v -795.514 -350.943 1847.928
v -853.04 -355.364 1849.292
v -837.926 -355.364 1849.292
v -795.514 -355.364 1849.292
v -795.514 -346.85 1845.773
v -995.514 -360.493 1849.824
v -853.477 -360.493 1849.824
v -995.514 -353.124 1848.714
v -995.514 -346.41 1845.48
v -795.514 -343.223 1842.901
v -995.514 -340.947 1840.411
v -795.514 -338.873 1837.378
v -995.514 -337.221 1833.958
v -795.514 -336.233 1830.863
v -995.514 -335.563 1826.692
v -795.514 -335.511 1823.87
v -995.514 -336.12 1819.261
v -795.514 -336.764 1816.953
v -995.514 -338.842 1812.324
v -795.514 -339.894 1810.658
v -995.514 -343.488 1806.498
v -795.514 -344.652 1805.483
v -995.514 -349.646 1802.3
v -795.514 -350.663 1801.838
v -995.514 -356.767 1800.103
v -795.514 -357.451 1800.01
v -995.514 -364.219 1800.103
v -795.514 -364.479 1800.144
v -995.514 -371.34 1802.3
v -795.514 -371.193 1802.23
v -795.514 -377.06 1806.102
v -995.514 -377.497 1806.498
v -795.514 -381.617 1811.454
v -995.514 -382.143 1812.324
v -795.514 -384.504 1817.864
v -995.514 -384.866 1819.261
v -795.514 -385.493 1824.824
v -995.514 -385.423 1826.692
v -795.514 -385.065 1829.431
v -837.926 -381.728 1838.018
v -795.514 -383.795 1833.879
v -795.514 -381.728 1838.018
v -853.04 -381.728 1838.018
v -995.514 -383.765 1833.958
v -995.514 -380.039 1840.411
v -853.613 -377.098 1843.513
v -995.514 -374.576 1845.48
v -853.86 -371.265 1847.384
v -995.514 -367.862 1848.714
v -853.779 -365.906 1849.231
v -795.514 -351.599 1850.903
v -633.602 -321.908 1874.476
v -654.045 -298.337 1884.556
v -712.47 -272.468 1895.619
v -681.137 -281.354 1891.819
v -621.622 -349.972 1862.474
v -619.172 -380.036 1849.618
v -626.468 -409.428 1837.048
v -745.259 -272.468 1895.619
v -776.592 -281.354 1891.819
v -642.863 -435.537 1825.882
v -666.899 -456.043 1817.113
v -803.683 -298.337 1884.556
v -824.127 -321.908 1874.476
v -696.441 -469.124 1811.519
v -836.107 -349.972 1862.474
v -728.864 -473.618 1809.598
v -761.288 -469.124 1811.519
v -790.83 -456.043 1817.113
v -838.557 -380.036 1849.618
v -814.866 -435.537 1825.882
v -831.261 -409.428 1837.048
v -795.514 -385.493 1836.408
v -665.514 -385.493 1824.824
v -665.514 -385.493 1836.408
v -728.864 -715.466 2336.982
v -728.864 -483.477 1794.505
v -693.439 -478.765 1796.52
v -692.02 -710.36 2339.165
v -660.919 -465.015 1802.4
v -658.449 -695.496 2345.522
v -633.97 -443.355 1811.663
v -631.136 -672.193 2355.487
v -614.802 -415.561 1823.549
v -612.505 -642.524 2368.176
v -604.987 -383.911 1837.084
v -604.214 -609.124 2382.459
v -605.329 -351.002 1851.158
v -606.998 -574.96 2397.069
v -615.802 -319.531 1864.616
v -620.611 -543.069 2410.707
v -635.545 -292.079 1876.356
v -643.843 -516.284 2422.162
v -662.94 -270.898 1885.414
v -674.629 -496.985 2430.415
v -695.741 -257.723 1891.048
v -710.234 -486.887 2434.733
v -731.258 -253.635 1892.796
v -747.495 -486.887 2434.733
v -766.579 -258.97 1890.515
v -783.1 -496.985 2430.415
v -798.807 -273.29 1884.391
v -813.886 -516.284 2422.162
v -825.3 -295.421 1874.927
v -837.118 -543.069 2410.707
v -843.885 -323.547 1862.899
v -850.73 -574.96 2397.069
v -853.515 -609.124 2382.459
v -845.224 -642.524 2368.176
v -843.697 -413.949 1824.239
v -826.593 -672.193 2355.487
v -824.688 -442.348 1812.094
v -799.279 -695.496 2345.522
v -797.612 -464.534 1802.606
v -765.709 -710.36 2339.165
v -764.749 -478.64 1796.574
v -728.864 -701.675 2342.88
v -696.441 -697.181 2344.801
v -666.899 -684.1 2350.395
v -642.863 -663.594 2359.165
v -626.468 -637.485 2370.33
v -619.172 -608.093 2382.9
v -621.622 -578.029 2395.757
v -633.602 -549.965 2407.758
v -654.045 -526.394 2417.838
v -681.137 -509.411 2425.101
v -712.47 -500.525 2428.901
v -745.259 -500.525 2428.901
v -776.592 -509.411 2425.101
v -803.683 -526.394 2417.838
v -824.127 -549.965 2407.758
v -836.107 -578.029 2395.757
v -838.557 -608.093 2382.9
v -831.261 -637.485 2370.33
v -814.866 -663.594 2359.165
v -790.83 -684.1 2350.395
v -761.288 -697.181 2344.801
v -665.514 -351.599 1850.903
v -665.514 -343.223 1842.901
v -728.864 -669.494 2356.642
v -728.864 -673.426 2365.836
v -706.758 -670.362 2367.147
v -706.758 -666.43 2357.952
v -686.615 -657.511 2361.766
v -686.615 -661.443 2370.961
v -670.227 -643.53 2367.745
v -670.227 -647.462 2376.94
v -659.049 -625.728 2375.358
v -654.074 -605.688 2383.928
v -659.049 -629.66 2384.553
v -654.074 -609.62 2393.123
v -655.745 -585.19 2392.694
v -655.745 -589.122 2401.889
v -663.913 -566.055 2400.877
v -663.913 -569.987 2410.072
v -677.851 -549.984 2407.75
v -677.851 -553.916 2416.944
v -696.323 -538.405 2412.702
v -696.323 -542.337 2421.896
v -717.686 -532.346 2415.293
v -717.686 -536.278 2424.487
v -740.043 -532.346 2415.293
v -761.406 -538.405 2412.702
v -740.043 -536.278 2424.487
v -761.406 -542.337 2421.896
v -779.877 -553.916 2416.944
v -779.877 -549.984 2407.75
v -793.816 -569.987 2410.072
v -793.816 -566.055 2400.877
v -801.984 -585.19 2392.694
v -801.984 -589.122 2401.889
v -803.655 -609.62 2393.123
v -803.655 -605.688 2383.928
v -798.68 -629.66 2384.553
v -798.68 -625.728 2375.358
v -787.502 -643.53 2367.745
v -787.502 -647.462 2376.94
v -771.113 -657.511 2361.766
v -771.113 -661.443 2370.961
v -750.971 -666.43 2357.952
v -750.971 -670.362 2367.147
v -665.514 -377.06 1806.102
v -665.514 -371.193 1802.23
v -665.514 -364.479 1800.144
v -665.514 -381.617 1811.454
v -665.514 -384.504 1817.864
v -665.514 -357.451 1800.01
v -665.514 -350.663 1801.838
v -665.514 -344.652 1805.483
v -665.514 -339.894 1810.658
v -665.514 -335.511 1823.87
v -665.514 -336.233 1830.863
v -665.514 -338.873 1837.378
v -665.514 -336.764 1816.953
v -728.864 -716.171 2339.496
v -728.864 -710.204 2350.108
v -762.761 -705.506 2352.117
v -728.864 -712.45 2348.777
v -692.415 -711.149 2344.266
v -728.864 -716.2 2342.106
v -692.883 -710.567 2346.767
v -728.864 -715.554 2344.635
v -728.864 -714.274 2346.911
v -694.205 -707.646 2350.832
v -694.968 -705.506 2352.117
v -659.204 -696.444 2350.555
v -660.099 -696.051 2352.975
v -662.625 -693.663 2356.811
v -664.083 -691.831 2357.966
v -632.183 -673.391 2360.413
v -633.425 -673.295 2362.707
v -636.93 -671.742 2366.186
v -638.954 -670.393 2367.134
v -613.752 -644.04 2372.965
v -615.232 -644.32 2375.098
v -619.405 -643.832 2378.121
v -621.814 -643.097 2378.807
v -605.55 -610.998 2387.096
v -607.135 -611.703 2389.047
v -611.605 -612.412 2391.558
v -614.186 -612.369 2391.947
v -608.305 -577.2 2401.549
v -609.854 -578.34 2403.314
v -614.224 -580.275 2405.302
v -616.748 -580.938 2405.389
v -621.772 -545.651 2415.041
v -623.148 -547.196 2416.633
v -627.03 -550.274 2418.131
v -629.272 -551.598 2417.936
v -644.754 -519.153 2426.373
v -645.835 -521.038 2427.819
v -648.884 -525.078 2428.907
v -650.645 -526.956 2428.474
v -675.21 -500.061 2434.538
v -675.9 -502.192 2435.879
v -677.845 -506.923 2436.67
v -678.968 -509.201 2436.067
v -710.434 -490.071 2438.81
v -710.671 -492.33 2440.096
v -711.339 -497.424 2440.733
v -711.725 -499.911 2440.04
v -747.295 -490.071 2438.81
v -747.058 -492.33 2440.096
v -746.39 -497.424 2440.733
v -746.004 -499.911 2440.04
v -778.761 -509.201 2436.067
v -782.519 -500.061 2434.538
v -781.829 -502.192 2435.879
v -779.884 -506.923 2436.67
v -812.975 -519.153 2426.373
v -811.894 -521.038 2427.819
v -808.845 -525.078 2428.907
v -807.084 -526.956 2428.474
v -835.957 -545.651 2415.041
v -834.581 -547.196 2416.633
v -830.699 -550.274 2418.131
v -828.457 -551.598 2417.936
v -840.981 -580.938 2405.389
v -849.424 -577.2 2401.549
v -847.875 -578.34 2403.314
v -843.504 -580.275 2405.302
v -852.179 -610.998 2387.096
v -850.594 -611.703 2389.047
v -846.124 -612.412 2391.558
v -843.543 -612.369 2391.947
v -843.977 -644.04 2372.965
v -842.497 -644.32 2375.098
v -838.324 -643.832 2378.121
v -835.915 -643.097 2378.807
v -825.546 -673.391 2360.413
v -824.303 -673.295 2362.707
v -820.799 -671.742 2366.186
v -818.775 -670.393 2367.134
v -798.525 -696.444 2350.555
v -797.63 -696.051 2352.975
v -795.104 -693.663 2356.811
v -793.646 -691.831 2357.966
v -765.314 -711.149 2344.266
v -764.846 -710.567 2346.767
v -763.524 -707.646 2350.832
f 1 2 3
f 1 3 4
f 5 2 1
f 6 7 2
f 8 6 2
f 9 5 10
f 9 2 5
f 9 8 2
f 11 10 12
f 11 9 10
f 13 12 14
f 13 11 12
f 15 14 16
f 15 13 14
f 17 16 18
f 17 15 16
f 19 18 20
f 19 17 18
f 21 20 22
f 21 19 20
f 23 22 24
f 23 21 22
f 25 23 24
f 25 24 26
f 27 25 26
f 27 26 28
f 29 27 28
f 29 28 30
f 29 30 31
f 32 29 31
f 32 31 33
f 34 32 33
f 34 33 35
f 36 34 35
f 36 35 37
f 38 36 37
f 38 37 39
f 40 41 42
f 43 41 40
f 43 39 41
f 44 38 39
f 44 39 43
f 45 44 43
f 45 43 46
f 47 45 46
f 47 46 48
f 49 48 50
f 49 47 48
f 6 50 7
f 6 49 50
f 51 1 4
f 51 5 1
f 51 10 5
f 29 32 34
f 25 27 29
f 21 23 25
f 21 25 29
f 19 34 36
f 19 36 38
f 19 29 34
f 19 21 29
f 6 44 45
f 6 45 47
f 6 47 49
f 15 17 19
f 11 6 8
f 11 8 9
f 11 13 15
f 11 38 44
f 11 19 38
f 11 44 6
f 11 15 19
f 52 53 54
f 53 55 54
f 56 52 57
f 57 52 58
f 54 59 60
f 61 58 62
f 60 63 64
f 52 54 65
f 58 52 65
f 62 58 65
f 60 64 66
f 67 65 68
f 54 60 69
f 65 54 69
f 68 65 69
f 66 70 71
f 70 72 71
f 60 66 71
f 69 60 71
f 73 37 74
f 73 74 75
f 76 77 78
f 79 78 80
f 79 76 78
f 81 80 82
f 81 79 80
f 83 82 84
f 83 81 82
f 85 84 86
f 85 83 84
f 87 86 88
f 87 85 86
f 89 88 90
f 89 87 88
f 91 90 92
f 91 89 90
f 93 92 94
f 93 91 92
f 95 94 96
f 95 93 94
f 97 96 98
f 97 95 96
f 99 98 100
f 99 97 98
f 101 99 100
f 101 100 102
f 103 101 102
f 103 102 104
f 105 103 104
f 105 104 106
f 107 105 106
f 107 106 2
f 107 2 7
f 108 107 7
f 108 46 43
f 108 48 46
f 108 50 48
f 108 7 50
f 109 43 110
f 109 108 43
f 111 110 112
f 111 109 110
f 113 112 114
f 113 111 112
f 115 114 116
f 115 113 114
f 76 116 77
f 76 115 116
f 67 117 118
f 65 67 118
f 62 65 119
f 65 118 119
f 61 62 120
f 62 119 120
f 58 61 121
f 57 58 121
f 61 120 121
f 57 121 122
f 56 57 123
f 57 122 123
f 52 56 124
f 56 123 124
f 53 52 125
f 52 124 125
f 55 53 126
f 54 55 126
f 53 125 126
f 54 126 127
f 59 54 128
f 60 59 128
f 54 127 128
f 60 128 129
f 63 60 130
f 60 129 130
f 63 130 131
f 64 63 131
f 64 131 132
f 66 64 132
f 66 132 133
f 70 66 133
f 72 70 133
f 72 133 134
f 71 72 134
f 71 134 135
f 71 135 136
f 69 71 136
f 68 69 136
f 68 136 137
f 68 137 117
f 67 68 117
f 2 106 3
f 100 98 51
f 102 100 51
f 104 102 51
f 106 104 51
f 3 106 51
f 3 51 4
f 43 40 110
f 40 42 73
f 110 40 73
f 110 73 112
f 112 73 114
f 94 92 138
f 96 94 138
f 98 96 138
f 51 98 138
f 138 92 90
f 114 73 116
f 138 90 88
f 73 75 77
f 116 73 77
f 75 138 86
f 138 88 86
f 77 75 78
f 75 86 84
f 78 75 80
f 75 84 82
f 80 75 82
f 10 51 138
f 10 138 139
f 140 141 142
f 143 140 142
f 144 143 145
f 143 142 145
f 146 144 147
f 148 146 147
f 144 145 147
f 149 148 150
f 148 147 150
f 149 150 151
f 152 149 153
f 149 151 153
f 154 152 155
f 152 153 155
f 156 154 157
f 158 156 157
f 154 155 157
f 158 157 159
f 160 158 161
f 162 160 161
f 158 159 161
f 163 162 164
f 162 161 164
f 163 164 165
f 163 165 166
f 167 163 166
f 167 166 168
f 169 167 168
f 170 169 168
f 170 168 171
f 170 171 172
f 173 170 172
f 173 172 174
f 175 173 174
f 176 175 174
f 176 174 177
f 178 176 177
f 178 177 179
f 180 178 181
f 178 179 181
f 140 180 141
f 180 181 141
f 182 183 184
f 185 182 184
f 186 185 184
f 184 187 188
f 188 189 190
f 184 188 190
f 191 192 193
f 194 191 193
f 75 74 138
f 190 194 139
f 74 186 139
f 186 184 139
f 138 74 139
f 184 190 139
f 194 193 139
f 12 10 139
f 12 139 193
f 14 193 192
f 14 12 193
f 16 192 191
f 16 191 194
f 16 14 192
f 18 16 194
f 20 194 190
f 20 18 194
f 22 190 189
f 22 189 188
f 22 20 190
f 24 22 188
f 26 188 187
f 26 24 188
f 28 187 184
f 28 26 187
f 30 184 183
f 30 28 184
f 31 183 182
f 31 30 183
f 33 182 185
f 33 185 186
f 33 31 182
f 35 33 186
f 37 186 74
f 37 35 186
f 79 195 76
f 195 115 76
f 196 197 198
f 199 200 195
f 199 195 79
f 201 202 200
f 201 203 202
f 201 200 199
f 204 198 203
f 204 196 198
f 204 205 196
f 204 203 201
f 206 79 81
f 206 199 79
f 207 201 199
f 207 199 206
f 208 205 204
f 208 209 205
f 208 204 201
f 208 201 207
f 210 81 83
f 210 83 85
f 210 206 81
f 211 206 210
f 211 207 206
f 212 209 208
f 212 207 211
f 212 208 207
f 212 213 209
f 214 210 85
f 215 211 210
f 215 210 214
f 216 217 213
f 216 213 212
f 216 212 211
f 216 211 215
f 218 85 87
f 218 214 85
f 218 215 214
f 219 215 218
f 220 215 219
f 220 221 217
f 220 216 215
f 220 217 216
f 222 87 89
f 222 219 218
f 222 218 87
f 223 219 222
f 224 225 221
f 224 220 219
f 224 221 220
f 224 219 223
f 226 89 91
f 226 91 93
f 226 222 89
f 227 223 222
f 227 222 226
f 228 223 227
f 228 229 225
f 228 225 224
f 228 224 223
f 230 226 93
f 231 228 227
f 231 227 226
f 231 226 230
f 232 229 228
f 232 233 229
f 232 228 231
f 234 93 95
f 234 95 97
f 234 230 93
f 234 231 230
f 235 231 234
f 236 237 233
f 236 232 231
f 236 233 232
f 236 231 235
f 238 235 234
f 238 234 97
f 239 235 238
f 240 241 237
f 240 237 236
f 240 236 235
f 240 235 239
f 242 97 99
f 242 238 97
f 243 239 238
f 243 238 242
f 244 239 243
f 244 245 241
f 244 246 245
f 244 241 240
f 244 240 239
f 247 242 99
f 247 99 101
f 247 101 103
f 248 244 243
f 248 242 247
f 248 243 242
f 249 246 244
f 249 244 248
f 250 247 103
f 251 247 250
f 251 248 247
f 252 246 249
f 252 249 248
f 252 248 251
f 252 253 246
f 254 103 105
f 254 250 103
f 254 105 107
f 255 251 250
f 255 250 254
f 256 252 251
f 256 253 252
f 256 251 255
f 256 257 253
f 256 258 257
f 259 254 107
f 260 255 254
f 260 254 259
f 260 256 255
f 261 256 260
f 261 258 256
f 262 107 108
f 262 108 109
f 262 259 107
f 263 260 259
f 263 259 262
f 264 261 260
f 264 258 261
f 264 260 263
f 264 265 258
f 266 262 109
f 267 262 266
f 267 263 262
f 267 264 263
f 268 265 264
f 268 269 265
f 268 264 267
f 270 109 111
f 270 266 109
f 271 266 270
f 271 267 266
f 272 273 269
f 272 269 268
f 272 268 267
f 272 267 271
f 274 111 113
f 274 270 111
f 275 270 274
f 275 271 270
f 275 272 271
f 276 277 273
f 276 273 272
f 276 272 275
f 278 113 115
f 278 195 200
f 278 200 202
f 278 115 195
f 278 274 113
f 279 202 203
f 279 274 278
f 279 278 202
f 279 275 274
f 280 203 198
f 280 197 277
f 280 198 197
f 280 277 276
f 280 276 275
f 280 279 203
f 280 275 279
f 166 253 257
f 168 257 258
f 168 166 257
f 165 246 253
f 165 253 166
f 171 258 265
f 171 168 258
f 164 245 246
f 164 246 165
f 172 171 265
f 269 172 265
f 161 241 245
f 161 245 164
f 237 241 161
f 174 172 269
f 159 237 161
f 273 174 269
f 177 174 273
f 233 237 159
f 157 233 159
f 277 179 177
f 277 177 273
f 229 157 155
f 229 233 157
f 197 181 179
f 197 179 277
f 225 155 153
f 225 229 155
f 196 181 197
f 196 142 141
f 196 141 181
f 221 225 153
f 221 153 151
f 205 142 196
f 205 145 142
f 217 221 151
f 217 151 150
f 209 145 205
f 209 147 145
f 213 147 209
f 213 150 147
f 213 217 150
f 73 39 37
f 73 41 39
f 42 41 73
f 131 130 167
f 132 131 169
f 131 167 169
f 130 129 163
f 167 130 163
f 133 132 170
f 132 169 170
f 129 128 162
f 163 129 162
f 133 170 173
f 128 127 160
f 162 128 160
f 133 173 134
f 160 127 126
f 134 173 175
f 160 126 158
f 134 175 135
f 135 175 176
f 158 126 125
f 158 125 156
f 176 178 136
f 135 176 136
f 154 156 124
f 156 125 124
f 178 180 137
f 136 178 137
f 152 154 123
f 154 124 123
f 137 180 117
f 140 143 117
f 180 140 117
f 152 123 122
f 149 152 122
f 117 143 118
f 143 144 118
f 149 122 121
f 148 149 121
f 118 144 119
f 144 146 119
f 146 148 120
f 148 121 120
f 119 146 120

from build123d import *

# Parameters (mm, degrees)
CROQUIS2_R              = 25.000000002
SALIENTE_EXTRUIR1_DEPTH = 200
SALIENTE_EXTRUIR3_START = -550
CROQUIS5_R              = 125
CROQUIS5_R_2            = 110
SALIENTE_EXTRUIR3_DEPTH = 600
CROQUIS6_R              = 125
CROQUIS6_R_2            = 75
SALIENTE_EXTRUIR4_DEPTH = 10
REDONDEO1_R             = 10
SALIENTE_EXTRUIR5_START = -10
CROQUIS7_R              = 125
SALIENTE_EXTRUIR5_DEPTH = 10
SALIENTE_EXTRUIR7_DEPTH = 130


with BuildPart() as part:
    # Croquis2 → Saliente-Extruir1 (new body)
    with BuildSketch(Plane.ZY.offset(995.514439922)):
        with Locations((1824.824247225, -360.492761656)):
            Circle(CROQUIS2_R)
    extrude(amount=-SALIENTE_EXTRUIR1_DEPTH)

    # Croquis5 → Saliente-Extruir3 (add)
    with BuildSketch(Plane(origin=(0, -1175.698746169, 2749.222800852), x_dir=(1, 0, 0), z_dir=(0, -0.39320162856731994, 0.919452271350725)).offset(SALIENTE_EXTRUIR3_START)):
        with Locations(Location((-728.864439922, 386.067977351, 0), (0, 0, 270))):
            Circle(CROQUIS5_R)
        with Locations(Location((-728.864439922, 386.067977351, 0), (0, 0, 270))):
            Circle(CROQUIS5_R_2, mode=Mode.SUBTRACT)
    extrude(amount=-SALIENTE_EXTRUIR3_DEPTH)

    # Croquis6 → Saliente-Extruir4 (add)
    with BuildSketch(Plane(origin=(0, -959.437850457, 2243.524051609), x_dir=(1, 0, 0), z_dir=(0, -0.39320162856732, 0.919452271350725))):
        with Locations(Location((-728.864439922, 386.067977351, 0), (0, 0, 270))):
            Circle(CROQUIS6_R)
        with Locations(Location((-728.864439922, 386.067977351, 0), (0, 0, 270))):
            Circle(CROQUIS6_R_2, mode=Mode.SUBTRACT)
    extrude(amount=-SALIENTE_EXTRUIR4_DEPTH)

    # Redondeo1
    redondeo1_edges = [part.edges().sort_by_distance(p)[0] for p in [
        (-728.864439922, -489.535237867, 2444.476812612),
    ]]
    fillet(redondeo1_edges, radius=REDONDEO1_R)

    # Croquis7 → Saliente-Extruir5 (add)
    with BuildSketch(Plane(origin=(0, -723.516873317, 1691.852688798), x_dir=(-1, 0, 0), z_dir=(0, 0.39320162856732, -0.919452271350725)).offset(SALIENTE_EXTRUIR5_START)):
        with Locations(Location((728.864439922, 386.067977351, 0), (0, 0, 270))):
            Circle(CROQUIS7_R)
    extrude(amount=SALIENTE_EXTRUIR5_DEPTH)

    # Croquis11 → Saliente-Extruir7 (add)
    with BuildSketch(Plane(origin=(-795.514439922, 0, 0), x_dir=(0, 0, -1), z_dir=(1, 0, 0))):
        with BuildLine():
            Line((-1850.902577314, -351.598827639), (-1842.90075375, -343.22313769))
            ThreePointArc((-1842.90075375, -343.22313769), (-1801.83794044, -350.662720941), (-1824.824247225, -385.492761657))
            Line((-1824.824247225, -385.492761657), (-1836.407915144, -385.492761657))
            Line((-1836.407915144, -385.492761657), (-1850.902577314, -351.598827639))
        make_face()
    extrude(amount=SALIENTE_EXTRUIR7_DEPTH)


solid = part.part
